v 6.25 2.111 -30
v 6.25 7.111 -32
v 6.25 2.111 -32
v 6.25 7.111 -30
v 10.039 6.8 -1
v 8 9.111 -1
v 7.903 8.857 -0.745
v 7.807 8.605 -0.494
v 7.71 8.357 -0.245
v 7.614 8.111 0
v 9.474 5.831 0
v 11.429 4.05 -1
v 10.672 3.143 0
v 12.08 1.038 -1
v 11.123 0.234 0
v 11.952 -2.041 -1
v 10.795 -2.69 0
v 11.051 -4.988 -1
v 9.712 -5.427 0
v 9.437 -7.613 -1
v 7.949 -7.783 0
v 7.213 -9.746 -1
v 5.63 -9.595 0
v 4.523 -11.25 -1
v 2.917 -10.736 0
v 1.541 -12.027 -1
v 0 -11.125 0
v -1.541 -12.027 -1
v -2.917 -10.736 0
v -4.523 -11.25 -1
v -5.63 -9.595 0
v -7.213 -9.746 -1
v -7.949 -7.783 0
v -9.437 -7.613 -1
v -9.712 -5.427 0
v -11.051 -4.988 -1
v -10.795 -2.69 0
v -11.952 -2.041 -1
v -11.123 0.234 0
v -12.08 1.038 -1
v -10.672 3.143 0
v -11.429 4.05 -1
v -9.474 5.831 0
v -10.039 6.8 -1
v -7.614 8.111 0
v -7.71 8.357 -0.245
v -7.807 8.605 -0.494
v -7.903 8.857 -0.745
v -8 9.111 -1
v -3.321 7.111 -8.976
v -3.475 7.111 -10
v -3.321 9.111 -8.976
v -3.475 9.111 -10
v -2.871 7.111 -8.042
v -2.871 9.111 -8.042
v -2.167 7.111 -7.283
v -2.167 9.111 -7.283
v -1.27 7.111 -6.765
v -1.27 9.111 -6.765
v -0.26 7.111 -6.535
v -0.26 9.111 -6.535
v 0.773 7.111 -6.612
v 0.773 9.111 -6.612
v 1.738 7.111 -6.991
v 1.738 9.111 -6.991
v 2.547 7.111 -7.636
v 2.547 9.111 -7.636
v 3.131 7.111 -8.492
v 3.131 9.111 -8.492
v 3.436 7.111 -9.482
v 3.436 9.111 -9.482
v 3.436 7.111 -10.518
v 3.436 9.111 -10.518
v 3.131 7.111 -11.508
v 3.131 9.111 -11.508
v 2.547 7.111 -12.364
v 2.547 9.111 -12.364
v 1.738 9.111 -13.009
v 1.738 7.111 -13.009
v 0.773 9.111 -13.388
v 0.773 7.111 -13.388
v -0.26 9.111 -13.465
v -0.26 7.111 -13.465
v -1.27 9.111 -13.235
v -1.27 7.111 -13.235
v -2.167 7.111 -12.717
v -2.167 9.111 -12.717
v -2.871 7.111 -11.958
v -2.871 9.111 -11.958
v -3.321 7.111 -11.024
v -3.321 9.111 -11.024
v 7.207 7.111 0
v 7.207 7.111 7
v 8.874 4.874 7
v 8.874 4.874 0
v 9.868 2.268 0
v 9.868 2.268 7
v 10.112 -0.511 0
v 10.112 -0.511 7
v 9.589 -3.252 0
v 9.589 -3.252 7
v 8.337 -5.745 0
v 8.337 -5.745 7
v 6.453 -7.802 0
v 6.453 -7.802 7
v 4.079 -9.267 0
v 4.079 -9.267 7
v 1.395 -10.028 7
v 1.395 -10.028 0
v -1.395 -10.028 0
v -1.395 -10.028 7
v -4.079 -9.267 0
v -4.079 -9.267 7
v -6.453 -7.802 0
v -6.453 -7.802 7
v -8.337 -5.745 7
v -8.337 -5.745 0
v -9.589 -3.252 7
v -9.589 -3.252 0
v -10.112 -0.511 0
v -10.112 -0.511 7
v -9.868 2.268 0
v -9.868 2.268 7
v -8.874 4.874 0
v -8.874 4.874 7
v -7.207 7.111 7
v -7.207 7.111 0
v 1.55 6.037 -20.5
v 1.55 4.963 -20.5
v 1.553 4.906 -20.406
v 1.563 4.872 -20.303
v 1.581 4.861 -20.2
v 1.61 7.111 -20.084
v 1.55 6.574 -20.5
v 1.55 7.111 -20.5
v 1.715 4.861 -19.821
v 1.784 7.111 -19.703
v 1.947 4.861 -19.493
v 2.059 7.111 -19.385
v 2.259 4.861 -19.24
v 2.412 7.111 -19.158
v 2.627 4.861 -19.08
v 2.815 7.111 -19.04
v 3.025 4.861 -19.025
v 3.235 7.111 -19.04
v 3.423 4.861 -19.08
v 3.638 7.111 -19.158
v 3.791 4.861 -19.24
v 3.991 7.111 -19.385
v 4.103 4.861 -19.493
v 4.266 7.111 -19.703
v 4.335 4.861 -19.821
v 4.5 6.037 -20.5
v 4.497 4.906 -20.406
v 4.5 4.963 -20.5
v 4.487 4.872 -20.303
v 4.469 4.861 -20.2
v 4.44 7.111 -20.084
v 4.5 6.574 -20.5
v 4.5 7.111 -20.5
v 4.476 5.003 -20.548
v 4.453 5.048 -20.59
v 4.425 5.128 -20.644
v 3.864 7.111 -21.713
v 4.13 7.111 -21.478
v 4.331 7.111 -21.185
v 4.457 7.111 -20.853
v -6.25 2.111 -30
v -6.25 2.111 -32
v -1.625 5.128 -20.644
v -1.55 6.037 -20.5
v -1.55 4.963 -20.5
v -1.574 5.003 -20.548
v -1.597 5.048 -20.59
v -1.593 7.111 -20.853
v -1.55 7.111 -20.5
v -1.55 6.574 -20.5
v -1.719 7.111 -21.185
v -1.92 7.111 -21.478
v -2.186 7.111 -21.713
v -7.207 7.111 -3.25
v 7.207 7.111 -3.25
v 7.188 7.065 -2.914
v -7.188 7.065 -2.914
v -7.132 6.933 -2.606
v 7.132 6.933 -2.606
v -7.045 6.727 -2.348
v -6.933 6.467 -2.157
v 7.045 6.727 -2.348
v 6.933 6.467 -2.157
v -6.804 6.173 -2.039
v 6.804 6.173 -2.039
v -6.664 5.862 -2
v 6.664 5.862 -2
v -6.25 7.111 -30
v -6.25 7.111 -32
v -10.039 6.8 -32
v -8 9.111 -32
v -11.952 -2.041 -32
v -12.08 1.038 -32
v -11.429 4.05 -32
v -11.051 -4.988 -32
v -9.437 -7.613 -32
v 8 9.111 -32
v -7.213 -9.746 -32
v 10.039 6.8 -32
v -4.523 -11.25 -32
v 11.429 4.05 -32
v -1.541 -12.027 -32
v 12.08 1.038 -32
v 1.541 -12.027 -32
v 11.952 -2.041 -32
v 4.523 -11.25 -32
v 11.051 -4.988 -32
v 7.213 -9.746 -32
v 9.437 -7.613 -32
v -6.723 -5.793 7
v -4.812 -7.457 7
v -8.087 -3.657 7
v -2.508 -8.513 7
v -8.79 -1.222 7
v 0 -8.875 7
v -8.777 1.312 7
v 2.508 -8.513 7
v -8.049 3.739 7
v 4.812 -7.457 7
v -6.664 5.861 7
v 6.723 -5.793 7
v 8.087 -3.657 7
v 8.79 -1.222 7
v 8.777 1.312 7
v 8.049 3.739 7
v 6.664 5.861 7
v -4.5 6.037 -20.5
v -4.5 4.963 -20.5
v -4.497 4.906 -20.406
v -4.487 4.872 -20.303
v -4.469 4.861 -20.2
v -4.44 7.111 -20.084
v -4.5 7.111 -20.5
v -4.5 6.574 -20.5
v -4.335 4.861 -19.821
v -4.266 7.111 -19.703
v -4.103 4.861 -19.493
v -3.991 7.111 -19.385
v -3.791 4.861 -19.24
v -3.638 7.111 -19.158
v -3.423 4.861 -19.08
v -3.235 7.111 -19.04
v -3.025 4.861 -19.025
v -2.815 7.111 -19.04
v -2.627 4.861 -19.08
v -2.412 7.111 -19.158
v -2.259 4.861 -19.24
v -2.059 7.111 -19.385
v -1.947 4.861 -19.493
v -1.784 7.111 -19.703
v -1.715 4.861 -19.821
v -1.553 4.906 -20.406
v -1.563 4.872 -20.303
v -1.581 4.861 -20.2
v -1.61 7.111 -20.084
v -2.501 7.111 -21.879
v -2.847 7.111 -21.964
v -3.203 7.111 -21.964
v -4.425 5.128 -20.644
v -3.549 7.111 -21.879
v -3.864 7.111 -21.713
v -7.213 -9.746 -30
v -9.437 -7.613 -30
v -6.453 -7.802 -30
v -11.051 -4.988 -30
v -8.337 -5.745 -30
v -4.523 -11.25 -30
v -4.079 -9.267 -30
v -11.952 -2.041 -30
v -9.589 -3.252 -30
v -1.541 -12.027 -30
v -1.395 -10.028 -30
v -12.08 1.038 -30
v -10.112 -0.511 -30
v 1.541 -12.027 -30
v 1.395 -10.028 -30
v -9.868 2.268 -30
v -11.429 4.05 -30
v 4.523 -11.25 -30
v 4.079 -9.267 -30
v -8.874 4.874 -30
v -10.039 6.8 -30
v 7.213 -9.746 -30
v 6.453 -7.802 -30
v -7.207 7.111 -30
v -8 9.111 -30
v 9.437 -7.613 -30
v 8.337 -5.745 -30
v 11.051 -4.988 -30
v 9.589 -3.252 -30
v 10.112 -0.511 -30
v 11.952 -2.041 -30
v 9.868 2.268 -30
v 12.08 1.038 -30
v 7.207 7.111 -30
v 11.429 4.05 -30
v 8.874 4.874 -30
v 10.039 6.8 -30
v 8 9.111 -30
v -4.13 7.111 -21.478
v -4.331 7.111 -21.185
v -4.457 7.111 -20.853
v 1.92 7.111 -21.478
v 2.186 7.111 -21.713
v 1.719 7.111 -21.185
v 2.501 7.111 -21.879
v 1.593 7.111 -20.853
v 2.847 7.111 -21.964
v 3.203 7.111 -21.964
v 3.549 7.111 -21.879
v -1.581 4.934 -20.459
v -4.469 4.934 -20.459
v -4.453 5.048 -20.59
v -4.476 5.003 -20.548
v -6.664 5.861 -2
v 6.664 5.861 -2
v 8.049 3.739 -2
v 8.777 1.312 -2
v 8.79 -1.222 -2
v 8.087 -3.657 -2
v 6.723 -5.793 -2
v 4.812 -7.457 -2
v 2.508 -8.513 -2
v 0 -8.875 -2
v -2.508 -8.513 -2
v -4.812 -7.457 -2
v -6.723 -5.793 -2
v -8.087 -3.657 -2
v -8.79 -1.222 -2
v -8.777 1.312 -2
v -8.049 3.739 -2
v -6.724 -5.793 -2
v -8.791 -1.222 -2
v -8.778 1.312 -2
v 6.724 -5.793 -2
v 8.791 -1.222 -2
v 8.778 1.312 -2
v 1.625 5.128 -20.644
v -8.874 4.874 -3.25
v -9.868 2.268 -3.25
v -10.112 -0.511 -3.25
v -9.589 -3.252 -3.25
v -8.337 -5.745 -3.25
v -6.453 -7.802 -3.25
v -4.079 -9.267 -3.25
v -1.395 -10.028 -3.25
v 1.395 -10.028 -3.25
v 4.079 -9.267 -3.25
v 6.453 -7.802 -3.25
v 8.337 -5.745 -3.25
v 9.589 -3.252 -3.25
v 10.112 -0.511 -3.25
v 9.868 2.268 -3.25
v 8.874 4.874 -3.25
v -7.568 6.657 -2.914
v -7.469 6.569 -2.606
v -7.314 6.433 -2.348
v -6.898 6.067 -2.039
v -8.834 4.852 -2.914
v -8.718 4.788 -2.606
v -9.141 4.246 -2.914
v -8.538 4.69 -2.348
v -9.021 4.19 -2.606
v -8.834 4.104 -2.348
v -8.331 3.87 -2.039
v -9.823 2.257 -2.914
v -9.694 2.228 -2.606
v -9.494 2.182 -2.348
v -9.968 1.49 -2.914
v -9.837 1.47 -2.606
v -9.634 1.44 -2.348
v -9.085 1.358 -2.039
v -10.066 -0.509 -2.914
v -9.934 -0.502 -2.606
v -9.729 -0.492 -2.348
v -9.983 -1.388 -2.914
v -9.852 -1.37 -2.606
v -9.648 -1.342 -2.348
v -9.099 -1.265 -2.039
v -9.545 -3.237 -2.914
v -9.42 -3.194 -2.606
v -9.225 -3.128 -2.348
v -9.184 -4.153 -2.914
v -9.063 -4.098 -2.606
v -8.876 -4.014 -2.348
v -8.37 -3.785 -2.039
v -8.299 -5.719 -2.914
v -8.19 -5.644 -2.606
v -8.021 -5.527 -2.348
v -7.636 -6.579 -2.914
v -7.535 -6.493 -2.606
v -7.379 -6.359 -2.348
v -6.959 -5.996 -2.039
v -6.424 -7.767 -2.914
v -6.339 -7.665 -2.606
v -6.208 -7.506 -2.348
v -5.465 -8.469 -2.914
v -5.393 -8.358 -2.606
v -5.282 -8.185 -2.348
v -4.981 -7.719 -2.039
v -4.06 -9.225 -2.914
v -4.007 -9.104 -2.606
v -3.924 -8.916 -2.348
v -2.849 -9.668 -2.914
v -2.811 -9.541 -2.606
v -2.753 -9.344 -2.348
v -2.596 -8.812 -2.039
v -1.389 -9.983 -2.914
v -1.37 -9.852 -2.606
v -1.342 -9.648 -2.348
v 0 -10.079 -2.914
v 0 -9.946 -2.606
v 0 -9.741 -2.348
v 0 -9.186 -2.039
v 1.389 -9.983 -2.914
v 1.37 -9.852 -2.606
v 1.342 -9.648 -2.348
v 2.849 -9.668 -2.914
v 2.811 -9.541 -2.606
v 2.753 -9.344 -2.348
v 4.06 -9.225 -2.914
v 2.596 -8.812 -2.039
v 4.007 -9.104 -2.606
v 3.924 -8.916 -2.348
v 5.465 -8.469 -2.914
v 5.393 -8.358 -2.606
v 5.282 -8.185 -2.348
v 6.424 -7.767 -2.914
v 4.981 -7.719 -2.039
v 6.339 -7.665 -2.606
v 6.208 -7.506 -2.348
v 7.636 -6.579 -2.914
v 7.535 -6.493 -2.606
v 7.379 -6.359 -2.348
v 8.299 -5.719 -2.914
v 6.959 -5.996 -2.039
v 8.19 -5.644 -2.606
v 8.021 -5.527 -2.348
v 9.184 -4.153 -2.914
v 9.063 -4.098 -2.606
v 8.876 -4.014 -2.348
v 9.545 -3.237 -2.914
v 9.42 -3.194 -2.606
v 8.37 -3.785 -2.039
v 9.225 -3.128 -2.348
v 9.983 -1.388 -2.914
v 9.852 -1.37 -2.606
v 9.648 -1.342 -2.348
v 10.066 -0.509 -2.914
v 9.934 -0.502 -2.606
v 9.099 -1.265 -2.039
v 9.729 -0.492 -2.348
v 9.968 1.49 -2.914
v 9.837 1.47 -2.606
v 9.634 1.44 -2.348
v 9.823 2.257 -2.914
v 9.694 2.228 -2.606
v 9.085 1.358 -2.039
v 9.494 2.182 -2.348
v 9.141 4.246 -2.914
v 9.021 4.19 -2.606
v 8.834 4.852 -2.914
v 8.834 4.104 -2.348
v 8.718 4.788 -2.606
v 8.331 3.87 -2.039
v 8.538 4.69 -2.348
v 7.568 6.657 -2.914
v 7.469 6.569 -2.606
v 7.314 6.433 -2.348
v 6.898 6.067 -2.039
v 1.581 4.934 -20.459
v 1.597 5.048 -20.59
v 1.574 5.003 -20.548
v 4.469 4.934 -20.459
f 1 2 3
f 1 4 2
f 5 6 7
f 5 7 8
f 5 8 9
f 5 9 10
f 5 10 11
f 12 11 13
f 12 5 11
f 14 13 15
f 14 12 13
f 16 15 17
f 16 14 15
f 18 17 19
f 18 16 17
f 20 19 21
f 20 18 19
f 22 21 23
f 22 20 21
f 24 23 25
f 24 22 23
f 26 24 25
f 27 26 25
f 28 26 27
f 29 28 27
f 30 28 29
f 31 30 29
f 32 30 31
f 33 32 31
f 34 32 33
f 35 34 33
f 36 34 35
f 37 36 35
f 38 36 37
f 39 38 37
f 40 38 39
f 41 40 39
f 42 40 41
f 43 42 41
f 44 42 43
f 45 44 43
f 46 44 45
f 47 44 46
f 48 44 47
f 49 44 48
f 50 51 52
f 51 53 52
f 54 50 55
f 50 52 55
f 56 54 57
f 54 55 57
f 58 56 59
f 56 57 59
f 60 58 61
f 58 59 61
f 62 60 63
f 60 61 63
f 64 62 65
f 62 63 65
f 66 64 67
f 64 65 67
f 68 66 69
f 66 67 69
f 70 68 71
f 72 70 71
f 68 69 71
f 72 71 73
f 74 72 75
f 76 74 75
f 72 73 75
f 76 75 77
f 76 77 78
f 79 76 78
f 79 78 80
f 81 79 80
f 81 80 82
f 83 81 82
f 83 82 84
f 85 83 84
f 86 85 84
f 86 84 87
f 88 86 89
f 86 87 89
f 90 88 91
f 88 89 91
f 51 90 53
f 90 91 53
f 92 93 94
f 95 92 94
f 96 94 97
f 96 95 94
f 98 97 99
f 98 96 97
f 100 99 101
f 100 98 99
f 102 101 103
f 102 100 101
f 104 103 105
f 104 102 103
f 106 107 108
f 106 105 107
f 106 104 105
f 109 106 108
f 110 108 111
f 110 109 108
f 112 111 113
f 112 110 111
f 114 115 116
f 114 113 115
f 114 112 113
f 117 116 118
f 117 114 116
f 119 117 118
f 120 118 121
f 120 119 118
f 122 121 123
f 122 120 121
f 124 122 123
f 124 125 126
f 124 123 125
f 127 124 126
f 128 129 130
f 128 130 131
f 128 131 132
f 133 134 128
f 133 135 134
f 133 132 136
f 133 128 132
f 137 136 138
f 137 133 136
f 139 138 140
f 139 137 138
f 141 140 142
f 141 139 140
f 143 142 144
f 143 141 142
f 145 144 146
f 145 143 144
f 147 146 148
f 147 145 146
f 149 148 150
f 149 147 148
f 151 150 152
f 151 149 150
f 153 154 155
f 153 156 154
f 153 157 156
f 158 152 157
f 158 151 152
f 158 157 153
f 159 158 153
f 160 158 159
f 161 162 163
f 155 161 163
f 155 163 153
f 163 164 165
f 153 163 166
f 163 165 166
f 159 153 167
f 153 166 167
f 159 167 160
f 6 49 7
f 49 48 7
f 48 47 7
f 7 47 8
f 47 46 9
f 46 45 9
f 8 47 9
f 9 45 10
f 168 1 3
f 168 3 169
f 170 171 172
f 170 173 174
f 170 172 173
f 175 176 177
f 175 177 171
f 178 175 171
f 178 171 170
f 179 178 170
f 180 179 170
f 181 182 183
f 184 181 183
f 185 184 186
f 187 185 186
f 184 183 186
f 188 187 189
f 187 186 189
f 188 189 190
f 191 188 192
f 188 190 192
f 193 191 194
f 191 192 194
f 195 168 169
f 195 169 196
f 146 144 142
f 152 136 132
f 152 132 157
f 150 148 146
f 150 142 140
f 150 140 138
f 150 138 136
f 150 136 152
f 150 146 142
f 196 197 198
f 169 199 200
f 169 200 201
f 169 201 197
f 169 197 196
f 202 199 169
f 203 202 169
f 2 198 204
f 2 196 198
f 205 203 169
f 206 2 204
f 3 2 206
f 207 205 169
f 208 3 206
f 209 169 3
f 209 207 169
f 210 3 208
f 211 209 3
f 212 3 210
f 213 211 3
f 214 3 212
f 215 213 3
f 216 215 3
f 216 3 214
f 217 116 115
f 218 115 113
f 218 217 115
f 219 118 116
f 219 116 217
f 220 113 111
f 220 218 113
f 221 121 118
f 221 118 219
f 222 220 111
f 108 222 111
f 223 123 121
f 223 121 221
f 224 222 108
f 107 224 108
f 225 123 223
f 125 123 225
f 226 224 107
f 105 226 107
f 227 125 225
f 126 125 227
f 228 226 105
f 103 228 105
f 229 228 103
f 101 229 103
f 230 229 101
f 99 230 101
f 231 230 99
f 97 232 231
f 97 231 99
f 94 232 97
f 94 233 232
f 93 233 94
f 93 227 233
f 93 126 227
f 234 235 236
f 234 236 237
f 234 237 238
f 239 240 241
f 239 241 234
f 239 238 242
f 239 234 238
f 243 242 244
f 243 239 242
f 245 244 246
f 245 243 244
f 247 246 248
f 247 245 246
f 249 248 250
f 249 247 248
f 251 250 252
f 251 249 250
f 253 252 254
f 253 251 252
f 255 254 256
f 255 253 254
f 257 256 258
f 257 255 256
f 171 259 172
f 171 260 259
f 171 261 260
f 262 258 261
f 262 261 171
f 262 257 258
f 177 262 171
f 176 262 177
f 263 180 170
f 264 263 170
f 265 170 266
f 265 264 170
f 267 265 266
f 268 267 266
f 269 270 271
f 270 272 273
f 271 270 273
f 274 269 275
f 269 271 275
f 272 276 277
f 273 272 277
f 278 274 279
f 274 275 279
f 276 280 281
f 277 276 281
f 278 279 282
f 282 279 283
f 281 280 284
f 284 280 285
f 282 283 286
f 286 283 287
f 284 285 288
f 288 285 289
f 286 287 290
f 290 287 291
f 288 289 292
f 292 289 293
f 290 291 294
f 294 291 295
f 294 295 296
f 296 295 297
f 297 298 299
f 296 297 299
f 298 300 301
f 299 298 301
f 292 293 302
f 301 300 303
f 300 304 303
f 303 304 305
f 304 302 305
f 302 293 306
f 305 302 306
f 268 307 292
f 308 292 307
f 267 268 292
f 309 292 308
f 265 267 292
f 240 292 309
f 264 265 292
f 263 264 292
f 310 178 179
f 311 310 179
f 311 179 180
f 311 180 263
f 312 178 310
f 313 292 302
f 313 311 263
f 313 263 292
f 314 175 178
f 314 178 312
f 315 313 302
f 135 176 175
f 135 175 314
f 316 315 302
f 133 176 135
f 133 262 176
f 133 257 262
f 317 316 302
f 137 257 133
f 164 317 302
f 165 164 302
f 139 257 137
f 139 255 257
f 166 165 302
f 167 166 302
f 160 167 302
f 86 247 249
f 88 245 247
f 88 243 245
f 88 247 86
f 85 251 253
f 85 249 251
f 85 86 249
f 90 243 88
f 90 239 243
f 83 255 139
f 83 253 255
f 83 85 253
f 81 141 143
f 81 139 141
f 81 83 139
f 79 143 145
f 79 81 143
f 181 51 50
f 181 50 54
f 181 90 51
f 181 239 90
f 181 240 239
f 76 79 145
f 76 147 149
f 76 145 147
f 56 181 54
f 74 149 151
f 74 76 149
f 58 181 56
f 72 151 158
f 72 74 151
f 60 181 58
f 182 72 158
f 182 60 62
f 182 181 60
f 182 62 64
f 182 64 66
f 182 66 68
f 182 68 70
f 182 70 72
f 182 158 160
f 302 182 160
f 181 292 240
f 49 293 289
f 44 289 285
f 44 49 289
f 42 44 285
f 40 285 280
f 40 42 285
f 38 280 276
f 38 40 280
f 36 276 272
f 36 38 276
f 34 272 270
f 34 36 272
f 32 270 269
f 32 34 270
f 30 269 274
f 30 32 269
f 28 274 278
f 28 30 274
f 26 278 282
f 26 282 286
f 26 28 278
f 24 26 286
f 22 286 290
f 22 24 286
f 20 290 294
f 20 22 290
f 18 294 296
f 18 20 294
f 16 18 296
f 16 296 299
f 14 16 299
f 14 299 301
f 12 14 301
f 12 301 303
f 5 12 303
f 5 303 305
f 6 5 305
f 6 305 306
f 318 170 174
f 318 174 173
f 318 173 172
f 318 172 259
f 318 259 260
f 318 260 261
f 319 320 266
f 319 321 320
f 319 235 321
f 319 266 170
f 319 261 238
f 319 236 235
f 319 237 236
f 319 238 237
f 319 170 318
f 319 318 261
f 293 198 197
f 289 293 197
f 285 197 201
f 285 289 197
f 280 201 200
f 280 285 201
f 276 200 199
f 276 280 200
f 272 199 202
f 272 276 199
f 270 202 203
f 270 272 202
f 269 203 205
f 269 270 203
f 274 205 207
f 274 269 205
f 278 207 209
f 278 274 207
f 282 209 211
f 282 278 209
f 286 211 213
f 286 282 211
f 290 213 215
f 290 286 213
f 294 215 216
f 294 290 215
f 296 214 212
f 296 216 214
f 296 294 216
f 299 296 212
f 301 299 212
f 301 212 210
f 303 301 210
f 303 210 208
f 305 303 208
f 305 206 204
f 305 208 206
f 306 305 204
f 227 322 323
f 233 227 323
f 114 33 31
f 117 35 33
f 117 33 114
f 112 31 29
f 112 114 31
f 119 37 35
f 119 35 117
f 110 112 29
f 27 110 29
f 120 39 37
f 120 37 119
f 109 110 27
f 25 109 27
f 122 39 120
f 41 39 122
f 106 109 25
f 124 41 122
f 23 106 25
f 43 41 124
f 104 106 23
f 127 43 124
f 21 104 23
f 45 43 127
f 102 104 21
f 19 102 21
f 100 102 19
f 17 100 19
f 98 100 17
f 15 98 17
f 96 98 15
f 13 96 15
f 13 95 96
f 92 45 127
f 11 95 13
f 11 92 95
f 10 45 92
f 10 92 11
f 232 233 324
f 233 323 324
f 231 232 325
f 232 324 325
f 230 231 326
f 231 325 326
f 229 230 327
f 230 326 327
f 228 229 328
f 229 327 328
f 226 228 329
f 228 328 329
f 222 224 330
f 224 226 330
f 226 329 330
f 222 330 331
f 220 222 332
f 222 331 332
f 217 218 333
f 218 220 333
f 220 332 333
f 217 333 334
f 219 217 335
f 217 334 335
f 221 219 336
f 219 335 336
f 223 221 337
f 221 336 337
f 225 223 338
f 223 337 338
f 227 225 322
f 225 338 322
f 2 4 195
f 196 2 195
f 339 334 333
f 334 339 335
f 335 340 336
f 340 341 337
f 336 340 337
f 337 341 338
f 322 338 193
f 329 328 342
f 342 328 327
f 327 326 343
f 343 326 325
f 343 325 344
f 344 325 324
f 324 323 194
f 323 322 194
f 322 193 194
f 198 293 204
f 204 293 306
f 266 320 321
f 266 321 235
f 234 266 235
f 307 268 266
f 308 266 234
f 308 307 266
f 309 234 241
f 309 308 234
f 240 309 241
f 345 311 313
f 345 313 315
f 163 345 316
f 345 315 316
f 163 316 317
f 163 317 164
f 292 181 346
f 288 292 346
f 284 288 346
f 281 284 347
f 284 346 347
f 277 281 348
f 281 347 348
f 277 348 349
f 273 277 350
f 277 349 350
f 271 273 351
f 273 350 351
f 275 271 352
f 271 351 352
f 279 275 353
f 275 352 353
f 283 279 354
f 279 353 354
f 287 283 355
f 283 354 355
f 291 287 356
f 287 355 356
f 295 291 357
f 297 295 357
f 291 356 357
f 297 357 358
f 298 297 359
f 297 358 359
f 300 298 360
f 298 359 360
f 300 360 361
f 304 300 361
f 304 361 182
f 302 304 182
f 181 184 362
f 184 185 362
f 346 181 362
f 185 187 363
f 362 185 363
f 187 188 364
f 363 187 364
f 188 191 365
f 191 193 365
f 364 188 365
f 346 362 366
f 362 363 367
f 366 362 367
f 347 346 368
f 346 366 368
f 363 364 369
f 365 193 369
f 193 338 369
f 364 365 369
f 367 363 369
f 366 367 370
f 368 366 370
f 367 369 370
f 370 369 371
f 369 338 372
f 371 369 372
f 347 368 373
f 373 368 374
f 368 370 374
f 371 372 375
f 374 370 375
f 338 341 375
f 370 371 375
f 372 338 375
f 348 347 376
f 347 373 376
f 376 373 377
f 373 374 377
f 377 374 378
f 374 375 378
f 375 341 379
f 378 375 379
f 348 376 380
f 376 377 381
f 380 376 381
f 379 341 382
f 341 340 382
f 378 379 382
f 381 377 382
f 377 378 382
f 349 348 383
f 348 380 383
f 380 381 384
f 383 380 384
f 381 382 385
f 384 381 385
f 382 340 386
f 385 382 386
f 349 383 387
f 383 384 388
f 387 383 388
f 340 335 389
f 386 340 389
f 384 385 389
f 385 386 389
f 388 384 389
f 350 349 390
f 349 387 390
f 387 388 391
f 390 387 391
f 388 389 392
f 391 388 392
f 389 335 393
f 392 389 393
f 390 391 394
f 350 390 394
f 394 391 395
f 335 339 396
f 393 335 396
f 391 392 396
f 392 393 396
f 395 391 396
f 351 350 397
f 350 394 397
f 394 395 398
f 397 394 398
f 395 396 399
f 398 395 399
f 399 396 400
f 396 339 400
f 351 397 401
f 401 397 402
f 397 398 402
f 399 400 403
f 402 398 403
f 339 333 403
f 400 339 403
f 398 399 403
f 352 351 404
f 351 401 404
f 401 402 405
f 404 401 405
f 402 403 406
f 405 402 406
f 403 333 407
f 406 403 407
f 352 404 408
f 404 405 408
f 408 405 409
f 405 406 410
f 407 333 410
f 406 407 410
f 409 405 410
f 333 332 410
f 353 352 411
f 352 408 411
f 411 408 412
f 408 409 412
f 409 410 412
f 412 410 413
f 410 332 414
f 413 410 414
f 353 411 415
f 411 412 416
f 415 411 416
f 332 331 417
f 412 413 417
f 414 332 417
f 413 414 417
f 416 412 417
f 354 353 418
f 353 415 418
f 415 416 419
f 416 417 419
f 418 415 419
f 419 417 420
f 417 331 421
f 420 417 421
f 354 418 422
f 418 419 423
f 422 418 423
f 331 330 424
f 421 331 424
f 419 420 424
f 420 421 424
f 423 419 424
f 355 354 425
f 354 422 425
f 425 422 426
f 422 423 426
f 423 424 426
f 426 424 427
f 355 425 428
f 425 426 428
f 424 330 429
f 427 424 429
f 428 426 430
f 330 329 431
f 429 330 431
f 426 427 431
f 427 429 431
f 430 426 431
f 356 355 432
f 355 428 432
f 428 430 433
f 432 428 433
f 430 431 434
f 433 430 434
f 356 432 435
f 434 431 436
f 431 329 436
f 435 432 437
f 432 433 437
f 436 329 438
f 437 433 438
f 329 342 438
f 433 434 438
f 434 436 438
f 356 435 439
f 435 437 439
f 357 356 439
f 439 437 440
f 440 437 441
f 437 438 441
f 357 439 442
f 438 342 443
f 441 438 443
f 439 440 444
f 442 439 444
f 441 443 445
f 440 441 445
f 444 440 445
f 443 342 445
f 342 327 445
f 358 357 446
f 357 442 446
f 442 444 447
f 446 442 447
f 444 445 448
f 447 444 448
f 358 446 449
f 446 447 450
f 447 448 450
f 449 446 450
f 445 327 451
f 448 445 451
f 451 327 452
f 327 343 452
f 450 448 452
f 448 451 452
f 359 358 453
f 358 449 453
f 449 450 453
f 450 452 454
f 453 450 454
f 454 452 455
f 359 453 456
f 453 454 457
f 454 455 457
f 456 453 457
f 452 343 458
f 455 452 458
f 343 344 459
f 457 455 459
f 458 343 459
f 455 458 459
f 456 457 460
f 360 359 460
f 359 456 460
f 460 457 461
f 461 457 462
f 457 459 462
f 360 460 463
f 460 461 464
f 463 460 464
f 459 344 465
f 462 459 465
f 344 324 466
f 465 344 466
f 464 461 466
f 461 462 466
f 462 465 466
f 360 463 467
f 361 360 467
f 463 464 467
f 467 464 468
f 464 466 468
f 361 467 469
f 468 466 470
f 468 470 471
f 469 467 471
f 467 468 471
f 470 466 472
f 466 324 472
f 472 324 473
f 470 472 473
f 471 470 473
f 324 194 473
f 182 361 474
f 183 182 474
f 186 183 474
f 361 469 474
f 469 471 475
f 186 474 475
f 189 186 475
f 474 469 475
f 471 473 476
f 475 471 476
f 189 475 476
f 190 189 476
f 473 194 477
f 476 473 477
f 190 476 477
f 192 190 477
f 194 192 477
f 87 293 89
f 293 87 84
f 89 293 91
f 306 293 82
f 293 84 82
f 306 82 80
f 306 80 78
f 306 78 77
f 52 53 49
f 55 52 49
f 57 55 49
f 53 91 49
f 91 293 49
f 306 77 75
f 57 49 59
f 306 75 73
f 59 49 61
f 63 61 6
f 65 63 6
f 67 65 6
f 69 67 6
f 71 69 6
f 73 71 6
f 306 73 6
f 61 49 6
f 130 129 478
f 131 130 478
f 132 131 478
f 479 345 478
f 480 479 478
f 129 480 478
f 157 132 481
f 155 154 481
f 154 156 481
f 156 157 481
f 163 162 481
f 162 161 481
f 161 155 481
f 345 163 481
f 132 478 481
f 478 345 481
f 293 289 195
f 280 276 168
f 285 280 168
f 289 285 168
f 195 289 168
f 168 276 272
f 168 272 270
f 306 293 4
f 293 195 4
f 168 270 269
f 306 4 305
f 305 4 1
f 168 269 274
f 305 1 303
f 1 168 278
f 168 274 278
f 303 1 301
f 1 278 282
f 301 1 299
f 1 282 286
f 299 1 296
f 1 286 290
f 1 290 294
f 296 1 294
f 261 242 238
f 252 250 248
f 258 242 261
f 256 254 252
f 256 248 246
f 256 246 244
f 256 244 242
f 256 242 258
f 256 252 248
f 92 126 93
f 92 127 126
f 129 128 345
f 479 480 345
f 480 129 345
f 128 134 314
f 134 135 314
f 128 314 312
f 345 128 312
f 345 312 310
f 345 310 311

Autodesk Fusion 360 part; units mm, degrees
sketch "Sketch1" plane through (0, 0, 0) normal (0, 0, 1) x (1, 0, 0)
  line L0 (0, -12.125) -> (0, 9.1113) construction
  line L1 (-8, 9.1113) -> (8, 9.1113)
  arc A0 (-8, 9.1113) -> (8, 9.1113) centre (0, 0) ccw
  arc A1 (-7.2073, 7.1113) -> (7.2073, 7.1113) centre (0, 0) ccw
  line L2 (-7.2073, 7.1113) -> (7.2073, 7.1113)
  arc A2 (-6.6641, 5.8613) -> (6.6641, 5.8613) centre (0, 0) ccw
  line L3 (-6.6641, 5.8613) -> (6.6641, 5.8613)
  dimension "d1" = 24.25
  dimension "d3" = 16
  dimension "d4" = -2
  dimension "d5" = -3.25
extrude "Extrude5" add sketch "Sketch1" along normal blind 7 contours A1 L2 makes body 1
extrude "Extrude6" add sketch "Sketch1" against normal blind 2 contours A1 L2 bodies 1
extrude "Extrude7" add sketch "Sketch1" against normal blind 30 contours L1 A0 bodies 1
fillet "Fillet1" radius 1.25 2 edges at (0, 7.1113, -2) (0, -10.125, -2) on bodies 1
chamfer "Chamfer1" distance 1 angle 45 2 edges at (0, -12.125, 0) (0, 9.1113, 0) on bodies 1
sketch "Sketch3" plane through (0, 9.1113, 0) normal (0, 1, 0) x (-1, 0, 0)
  line L0 (-8, -1) -> (-8, -30)
  line L1 (-8, -30) -> (8, -30)
  line L2 (0, 0) -> (0, -30) construction
  circle A0 centre (0, -10) radius 3.475
  line L3 (8, 0) -> (-8, 0)
  line L4 (8, -1) -> (-8, -1)
  line L5 (8, -30) -> (8, -1)
  dimension "d24" = 6.95
  dimension "d25" = 10
extrude "Extrude9" cut sketch "Sketch3" against normal blind 4 contours A0 bodies 1
sketch "Sketch4" plane through (0, 7.1113, 0) normal (0, -1, 0) x (1, 0, 0)
  line L0 (-7.2073, -3.25) -> (-7.2073, -30)
  line L1 (-7.2073, -30) -> (7.2073, -30)
  line L2 (-3.025, -20.5) -> (3.025, -20.5) construction
  circle A0 centre (-3.025, -20.5) radius 1.475
  circle A1 centre (3.025, -20.5) radius 1.475
  line L3 (0, -30) -> (0, -20.5) construction
  line L4 (7.2073, -3.25) -> (-7.2073, -3.25)
  line L5 (7.2073, -30) -> (7.2073, -3.25)
  circle A2 centre (0, -10) radius 3.475
  line L6 (-1.55, -20.5) -> (-4.5, -20.5)
  line L7 (1.55, -20.5) -> (4.5, -20.5)
  dimension "d28" = 6.05
  dimension "d29" = 2.95
  dimension "d30" = 2.95
  dimension "d31" = 9.5
extrude "Extrude10" add sketch "Sketch4" along normal blind 2.25 contours A0 L6 | A1 L7 picked at (-3.2653, -20.0009) picked at (2.5701, -20.0097) bodies 1
loft "Loft1" add profiles "Sketch4" section 1 face at (-2.5333, 6.3613, -20.5) section 2 contours A0 L6 picked at (-3.2708, -20.9258) on bodies 1 bodies 1
loft "Loft2" add profiles "Sketch4" section 1 face at (2.5333, 5.6113, -20.5) section 2 contours A1 L7 picked at (3.1344, -20.9793) on bodies 1 bodies 1
fillet "Fillet2" radius 0.5 2 edges at (3.025, 4.8613, -20.5) (-3.025, 4.8613, -20.5) on bodies 1
sketch "Sketch5" plane through (0, 0, -30) normal (0, 0, -1) x (1, 0, 0)
  arc A0 (7.2073, -7.1113) -> (-7.2073, -7.1113) centre (0, 0) ccw
  line L0 (7.2073, -7.1113) -> (-7.2073, -7.1113)
  arc A1 (8, -9.1113) -> (-8, -9.1113) centre (0, 0) ccw
  line L1 (-8, -9.1113) -> (8, -9.1113)
  line L2 (-6.25, -7.1113) -> (6.25, -7.1113)
  line L3 (6.25, -7.1113) -> (6.25, -2.1113)
  line L4 (6.25, -2.1113) -> (-6.25, -2.1113)
  line L5 (-6.25, -2.1113) -> (-6.25, -7.1113)
  dimension "d36" = 12.5
  dimension "d37" = 5
extrude "Extrude11" [suppressed]
extrude "Extrude12" add sketch "Sketch5" along normal blind 2 separate body contours A0 L0 L3 L4 L5 | A1 L1 makes body 2
move_face "OffsetFaces1" [suppressed]
chamfer "Chamfer2" [suppressed]
equation "d28 = 3.1 mm + d29"
equation "d30 = d29"
